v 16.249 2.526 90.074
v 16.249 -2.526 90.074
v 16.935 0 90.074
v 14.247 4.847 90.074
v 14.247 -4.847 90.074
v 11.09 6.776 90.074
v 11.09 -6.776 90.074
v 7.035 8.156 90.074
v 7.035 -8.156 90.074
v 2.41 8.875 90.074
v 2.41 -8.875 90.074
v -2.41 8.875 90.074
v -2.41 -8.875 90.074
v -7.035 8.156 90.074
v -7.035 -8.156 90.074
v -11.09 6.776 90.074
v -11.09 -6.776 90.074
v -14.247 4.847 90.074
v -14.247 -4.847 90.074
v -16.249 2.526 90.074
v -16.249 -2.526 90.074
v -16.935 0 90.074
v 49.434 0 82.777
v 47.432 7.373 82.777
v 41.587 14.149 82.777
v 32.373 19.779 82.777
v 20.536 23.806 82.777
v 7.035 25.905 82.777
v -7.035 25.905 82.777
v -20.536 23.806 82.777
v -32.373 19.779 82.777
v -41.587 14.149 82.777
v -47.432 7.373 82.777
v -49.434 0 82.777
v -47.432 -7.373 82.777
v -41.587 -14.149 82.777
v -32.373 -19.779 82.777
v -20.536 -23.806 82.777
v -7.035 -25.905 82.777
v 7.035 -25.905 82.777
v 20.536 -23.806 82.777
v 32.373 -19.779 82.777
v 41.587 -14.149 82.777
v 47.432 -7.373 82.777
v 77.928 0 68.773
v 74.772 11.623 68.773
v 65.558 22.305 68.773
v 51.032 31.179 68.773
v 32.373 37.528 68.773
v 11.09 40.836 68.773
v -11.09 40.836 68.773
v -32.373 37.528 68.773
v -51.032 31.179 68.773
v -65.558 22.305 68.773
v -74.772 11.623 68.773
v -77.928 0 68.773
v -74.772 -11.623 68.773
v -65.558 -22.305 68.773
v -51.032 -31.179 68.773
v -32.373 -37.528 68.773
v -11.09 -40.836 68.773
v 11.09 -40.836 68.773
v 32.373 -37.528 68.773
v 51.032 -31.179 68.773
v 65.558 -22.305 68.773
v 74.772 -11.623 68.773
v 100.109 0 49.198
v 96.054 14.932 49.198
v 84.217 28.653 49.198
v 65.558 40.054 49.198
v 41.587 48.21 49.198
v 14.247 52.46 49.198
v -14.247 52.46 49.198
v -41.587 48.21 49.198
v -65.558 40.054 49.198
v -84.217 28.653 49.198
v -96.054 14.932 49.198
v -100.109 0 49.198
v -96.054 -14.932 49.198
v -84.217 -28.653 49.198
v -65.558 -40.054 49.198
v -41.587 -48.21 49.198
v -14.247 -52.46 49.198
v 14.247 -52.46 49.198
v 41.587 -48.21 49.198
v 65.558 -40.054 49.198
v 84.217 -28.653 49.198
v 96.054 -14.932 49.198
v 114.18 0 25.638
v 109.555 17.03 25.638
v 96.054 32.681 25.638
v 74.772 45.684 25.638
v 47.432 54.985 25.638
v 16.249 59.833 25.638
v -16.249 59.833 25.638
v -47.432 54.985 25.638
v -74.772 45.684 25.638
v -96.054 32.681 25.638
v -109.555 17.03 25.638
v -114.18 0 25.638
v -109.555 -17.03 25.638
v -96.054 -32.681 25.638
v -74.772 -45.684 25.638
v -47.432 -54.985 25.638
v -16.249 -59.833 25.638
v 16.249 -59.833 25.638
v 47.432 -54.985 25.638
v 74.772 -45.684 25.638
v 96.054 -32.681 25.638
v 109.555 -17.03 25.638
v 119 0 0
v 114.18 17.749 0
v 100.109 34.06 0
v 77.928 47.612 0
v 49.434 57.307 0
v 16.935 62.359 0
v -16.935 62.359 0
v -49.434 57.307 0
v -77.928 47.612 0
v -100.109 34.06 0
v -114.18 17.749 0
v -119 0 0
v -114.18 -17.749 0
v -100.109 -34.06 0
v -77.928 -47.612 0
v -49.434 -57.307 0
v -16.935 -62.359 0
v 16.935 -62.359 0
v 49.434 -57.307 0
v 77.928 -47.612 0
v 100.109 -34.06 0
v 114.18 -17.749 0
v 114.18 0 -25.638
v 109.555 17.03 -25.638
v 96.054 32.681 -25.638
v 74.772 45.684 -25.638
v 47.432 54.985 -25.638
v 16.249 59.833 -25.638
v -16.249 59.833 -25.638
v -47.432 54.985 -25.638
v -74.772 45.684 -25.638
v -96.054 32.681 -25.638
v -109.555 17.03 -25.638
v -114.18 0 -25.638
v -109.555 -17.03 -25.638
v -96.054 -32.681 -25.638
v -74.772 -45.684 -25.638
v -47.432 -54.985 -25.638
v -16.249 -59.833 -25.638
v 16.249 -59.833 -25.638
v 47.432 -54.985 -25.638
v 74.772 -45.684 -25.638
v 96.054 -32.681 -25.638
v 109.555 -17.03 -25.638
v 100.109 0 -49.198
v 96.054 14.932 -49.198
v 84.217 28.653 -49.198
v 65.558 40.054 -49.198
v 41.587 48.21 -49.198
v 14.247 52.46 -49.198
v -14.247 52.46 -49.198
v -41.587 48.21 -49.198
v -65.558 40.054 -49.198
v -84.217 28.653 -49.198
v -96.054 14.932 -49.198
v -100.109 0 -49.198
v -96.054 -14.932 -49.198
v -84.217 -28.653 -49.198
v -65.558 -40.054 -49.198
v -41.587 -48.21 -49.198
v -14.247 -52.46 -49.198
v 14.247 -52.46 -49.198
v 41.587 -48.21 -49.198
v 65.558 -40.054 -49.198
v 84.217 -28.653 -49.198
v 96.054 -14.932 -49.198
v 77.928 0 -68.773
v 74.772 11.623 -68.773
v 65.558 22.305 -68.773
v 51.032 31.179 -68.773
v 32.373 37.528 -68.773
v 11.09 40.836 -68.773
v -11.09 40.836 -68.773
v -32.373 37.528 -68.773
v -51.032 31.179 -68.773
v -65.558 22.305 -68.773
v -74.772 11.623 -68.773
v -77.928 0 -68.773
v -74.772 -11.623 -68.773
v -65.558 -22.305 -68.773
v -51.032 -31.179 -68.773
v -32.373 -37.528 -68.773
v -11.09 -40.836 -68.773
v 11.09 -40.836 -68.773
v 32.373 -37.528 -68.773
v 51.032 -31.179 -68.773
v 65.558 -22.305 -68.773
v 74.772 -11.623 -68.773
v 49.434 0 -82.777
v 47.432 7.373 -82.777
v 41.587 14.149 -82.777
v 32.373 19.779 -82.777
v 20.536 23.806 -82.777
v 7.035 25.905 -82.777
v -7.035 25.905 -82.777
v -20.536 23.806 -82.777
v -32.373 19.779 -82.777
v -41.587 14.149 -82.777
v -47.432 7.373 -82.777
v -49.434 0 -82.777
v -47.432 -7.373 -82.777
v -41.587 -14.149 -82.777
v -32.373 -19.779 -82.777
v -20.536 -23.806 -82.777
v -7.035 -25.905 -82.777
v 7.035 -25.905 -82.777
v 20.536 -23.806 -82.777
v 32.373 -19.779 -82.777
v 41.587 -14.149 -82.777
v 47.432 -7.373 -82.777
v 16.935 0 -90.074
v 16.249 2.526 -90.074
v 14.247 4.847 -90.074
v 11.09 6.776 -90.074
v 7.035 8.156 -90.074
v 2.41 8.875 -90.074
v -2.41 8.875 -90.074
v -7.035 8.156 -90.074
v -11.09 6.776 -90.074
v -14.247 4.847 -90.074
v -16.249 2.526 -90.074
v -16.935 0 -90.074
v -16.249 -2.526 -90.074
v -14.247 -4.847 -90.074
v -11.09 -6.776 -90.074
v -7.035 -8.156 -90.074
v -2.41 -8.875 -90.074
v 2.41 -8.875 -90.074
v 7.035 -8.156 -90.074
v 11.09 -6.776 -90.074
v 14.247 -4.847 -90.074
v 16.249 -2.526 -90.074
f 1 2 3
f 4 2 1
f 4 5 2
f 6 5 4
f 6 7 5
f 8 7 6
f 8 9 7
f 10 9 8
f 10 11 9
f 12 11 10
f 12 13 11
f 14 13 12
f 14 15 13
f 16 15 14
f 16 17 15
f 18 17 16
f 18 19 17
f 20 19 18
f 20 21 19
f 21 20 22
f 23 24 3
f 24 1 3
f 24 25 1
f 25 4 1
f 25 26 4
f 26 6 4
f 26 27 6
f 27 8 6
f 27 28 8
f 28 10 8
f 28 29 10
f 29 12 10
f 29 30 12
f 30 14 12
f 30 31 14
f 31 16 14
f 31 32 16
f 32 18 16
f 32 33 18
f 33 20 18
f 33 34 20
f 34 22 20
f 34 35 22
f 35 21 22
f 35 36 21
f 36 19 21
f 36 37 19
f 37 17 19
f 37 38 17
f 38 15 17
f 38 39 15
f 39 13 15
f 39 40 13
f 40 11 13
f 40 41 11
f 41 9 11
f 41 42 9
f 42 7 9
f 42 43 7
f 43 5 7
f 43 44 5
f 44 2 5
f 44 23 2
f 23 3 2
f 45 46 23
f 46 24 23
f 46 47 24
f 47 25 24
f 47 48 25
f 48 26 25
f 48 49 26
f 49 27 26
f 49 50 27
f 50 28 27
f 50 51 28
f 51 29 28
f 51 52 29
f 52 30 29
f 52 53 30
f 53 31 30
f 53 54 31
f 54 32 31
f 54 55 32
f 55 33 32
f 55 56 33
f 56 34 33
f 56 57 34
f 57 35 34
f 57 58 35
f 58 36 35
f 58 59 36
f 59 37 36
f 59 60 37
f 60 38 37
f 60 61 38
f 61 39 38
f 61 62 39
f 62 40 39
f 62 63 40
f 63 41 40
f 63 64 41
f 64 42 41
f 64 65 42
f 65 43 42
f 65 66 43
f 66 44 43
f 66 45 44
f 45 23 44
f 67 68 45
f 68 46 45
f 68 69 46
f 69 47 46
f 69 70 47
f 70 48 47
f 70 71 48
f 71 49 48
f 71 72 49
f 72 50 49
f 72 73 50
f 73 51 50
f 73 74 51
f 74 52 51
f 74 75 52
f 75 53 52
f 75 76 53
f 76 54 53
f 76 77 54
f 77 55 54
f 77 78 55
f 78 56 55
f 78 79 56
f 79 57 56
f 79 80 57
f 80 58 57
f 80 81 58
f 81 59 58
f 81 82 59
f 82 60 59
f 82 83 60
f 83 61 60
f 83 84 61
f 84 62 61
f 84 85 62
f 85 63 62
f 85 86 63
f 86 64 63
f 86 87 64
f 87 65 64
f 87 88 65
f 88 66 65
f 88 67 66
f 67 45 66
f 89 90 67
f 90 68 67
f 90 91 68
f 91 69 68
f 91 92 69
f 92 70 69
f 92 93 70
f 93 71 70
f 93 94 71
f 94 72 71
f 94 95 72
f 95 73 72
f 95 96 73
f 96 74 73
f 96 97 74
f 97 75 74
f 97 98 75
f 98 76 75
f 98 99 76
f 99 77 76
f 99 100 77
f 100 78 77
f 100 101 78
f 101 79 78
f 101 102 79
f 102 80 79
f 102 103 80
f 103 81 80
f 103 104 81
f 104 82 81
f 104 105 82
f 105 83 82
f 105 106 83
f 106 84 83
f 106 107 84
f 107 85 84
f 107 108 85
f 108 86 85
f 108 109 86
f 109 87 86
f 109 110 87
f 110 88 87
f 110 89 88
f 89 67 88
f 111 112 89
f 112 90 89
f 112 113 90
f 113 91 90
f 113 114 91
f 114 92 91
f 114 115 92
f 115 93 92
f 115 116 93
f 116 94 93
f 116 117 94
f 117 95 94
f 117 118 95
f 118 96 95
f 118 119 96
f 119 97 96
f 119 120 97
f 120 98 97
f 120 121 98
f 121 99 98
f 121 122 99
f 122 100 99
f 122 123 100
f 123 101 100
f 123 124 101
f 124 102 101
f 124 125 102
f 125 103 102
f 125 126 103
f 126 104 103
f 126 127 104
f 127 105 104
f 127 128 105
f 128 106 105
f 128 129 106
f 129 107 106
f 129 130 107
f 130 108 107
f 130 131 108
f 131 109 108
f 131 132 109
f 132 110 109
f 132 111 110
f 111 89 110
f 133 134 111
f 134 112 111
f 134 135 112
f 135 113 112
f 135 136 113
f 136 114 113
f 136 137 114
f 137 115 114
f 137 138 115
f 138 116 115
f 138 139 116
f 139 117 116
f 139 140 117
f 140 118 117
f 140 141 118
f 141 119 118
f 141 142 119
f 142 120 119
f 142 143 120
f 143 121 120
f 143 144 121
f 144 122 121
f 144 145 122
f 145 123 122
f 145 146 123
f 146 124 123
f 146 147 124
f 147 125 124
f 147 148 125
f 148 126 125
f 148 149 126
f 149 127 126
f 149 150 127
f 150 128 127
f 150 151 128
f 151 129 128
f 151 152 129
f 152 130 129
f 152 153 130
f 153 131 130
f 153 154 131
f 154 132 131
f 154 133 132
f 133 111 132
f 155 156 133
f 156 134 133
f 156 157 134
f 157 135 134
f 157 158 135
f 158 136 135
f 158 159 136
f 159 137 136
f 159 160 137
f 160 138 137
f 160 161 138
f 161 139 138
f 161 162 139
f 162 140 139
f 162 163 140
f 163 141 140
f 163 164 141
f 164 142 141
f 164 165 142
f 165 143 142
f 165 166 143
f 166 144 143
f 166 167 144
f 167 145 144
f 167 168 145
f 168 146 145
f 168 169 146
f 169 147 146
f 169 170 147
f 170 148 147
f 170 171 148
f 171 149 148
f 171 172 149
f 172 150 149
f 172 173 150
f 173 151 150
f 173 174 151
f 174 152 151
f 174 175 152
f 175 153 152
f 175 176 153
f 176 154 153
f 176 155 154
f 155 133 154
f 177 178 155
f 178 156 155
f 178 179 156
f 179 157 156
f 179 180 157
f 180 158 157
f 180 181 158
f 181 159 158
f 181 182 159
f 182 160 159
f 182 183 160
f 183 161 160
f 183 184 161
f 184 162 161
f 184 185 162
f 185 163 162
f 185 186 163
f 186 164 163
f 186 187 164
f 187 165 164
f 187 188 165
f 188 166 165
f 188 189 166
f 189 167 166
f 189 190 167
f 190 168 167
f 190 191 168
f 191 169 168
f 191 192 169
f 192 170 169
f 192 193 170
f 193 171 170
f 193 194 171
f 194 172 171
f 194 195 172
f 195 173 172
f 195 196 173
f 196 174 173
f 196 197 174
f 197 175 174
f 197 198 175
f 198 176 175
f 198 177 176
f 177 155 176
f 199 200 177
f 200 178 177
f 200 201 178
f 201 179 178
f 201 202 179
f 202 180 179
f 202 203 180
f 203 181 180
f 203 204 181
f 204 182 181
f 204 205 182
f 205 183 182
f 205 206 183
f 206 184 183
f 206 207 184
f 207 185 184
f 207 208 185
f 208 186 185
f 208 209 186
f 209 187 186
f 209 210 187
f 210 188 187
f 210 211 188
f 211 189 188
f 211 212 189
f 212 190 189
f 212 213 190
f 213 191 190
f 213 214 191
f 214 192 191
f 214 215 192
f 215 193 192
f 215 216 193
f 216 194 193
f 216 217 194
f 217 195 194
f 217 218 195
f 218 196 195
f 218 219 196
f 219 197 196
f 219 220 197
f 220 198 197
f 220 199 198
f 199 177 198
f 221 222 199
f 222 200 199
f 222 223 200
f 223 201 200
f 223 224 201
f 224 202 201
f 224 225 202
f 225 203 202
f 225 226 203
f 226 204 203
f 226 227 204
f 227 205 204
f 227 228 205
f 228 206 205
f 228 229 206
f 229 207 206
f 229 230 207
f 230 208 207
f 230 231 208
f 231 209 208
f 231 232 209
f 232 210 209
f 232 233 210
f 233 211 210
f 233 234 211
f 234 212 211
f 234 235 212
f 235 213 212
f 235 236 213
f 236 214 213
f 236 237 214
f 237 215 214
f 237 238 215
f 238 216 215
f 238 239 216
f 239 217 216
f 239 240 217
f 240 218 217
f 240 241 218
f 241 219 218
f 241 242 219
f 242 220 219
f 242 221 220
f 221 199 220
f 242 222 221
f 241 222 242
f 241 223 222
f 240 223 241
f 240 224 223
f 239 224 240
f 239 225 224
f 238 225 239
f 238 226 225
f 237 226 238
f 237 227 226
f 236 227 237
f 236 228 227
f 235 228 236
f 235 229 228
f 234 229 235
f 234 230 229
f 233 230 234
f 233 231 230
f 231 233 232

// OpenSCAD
// Generated by SolidPython 1.0.1 on 2020-07-29 00:46:53


scale(v = [17, 9, 13]) {
	sphere(r = 7);
}
/***********************************************
*********      SolidPython code:      **********
************************************************
 
# import packages: SolidPython
from solid import *
from solid.utils import *
from itertools import chain, combinations, permutations


class Resize:

    def __init__(self, scad_file):
        self.scad_file = scad_file
        #self.scad_file = import_scad(scad_file)
        # cone/cylinder param:
        self.r1 = 0
        self.r2 = 0
        self.h = 0
        # rectangular prism param:
        self.w = 0
        self.l = 0
        # ellipse param:
        self.r = 0

    # import OpenScad code (file name corresponds to shape)


    # classify shape + parameters
    def assign(self, param1, param2, param3):
        if self.scad_file == 'cone.scad':
            self.r1 = param1
            self.r2 = param2
            self.h = param3
        elif self.scad_file == 'cylinder.scad':
            self.r1 = param1
            self.r2 = param2
            self.h = param3
        elif self.scad_file == 'rectangularPrism.scad':
            self.h = param1
            self.l = param2
            self.w = param3
        else:
            self.r = param1
            self.h = param2

    # resize parameters
    def iterate(self):
        x = range(3, 20, 2)
        i = 1
        if self.scad_file == 'cone.scad':
            tempList = list(permutations(x, 2))
            for temp in tempList:
                param1 = temp[0]
                param2 = temp[1]
                filepath = 'produced_scad_files/' + 'cone' + str(param1) + '_' + str(param2) + '_' + '.scad'
                scad_render_to_file(cylinder(h=param1, r1=param2, r2=0), filepath)

        elif self.scad_file == 'cylinder.scad':
            tempList = list(permutations(x, 3))
            for temp in tempList:
                param1 = temp[0]
                param2 = temp[1]
                filepath = 'produced_scad_files/' + 'cylinder' + str(param1) + '_' + str(param2) + '_' + '.scad'
                scad_render_to_file(cylinder(h=param1, r1=param2, r2=param2), filepath)

        elif self.scad_file == 'rectangularPrism.scad':
            tempList = list(permutations(x, 3))
            for temp in tempList:
                param1 = temp[0]
                param2 = temp[1]
                param3 = temp[2]
                filepath = 'produced_scad_files/' + 'rectangularPrism' + str(param1) + '_' + str(param2) + '_' + str(
                    param3) + '.scad'
                scad_render_to_file(cube(size=(param1, param2, param3)), filepath)

        elif self.scad_file == 'ellipse.scad':
            tempList = list(permutations(x, 4))
            for temp in tempList:
                param1 = temp[0]
                param2 = temp[1]
                param3 = temp[2]
                param4 = temp[3]
                filepath = 'produced_scad_files/' + 'ellipse' + str(param1) + '_' + str(param2) + '_' + str(param3) + '_' + str(param4) + '.scad'
                scad_render_to_file(scale([param1, param2, param3])(sphere(r=param4)), filepath)

    def render_to_scadfile(self):
        scad_render_to_file(scad, 'example.scad') 
 
************************************************/
